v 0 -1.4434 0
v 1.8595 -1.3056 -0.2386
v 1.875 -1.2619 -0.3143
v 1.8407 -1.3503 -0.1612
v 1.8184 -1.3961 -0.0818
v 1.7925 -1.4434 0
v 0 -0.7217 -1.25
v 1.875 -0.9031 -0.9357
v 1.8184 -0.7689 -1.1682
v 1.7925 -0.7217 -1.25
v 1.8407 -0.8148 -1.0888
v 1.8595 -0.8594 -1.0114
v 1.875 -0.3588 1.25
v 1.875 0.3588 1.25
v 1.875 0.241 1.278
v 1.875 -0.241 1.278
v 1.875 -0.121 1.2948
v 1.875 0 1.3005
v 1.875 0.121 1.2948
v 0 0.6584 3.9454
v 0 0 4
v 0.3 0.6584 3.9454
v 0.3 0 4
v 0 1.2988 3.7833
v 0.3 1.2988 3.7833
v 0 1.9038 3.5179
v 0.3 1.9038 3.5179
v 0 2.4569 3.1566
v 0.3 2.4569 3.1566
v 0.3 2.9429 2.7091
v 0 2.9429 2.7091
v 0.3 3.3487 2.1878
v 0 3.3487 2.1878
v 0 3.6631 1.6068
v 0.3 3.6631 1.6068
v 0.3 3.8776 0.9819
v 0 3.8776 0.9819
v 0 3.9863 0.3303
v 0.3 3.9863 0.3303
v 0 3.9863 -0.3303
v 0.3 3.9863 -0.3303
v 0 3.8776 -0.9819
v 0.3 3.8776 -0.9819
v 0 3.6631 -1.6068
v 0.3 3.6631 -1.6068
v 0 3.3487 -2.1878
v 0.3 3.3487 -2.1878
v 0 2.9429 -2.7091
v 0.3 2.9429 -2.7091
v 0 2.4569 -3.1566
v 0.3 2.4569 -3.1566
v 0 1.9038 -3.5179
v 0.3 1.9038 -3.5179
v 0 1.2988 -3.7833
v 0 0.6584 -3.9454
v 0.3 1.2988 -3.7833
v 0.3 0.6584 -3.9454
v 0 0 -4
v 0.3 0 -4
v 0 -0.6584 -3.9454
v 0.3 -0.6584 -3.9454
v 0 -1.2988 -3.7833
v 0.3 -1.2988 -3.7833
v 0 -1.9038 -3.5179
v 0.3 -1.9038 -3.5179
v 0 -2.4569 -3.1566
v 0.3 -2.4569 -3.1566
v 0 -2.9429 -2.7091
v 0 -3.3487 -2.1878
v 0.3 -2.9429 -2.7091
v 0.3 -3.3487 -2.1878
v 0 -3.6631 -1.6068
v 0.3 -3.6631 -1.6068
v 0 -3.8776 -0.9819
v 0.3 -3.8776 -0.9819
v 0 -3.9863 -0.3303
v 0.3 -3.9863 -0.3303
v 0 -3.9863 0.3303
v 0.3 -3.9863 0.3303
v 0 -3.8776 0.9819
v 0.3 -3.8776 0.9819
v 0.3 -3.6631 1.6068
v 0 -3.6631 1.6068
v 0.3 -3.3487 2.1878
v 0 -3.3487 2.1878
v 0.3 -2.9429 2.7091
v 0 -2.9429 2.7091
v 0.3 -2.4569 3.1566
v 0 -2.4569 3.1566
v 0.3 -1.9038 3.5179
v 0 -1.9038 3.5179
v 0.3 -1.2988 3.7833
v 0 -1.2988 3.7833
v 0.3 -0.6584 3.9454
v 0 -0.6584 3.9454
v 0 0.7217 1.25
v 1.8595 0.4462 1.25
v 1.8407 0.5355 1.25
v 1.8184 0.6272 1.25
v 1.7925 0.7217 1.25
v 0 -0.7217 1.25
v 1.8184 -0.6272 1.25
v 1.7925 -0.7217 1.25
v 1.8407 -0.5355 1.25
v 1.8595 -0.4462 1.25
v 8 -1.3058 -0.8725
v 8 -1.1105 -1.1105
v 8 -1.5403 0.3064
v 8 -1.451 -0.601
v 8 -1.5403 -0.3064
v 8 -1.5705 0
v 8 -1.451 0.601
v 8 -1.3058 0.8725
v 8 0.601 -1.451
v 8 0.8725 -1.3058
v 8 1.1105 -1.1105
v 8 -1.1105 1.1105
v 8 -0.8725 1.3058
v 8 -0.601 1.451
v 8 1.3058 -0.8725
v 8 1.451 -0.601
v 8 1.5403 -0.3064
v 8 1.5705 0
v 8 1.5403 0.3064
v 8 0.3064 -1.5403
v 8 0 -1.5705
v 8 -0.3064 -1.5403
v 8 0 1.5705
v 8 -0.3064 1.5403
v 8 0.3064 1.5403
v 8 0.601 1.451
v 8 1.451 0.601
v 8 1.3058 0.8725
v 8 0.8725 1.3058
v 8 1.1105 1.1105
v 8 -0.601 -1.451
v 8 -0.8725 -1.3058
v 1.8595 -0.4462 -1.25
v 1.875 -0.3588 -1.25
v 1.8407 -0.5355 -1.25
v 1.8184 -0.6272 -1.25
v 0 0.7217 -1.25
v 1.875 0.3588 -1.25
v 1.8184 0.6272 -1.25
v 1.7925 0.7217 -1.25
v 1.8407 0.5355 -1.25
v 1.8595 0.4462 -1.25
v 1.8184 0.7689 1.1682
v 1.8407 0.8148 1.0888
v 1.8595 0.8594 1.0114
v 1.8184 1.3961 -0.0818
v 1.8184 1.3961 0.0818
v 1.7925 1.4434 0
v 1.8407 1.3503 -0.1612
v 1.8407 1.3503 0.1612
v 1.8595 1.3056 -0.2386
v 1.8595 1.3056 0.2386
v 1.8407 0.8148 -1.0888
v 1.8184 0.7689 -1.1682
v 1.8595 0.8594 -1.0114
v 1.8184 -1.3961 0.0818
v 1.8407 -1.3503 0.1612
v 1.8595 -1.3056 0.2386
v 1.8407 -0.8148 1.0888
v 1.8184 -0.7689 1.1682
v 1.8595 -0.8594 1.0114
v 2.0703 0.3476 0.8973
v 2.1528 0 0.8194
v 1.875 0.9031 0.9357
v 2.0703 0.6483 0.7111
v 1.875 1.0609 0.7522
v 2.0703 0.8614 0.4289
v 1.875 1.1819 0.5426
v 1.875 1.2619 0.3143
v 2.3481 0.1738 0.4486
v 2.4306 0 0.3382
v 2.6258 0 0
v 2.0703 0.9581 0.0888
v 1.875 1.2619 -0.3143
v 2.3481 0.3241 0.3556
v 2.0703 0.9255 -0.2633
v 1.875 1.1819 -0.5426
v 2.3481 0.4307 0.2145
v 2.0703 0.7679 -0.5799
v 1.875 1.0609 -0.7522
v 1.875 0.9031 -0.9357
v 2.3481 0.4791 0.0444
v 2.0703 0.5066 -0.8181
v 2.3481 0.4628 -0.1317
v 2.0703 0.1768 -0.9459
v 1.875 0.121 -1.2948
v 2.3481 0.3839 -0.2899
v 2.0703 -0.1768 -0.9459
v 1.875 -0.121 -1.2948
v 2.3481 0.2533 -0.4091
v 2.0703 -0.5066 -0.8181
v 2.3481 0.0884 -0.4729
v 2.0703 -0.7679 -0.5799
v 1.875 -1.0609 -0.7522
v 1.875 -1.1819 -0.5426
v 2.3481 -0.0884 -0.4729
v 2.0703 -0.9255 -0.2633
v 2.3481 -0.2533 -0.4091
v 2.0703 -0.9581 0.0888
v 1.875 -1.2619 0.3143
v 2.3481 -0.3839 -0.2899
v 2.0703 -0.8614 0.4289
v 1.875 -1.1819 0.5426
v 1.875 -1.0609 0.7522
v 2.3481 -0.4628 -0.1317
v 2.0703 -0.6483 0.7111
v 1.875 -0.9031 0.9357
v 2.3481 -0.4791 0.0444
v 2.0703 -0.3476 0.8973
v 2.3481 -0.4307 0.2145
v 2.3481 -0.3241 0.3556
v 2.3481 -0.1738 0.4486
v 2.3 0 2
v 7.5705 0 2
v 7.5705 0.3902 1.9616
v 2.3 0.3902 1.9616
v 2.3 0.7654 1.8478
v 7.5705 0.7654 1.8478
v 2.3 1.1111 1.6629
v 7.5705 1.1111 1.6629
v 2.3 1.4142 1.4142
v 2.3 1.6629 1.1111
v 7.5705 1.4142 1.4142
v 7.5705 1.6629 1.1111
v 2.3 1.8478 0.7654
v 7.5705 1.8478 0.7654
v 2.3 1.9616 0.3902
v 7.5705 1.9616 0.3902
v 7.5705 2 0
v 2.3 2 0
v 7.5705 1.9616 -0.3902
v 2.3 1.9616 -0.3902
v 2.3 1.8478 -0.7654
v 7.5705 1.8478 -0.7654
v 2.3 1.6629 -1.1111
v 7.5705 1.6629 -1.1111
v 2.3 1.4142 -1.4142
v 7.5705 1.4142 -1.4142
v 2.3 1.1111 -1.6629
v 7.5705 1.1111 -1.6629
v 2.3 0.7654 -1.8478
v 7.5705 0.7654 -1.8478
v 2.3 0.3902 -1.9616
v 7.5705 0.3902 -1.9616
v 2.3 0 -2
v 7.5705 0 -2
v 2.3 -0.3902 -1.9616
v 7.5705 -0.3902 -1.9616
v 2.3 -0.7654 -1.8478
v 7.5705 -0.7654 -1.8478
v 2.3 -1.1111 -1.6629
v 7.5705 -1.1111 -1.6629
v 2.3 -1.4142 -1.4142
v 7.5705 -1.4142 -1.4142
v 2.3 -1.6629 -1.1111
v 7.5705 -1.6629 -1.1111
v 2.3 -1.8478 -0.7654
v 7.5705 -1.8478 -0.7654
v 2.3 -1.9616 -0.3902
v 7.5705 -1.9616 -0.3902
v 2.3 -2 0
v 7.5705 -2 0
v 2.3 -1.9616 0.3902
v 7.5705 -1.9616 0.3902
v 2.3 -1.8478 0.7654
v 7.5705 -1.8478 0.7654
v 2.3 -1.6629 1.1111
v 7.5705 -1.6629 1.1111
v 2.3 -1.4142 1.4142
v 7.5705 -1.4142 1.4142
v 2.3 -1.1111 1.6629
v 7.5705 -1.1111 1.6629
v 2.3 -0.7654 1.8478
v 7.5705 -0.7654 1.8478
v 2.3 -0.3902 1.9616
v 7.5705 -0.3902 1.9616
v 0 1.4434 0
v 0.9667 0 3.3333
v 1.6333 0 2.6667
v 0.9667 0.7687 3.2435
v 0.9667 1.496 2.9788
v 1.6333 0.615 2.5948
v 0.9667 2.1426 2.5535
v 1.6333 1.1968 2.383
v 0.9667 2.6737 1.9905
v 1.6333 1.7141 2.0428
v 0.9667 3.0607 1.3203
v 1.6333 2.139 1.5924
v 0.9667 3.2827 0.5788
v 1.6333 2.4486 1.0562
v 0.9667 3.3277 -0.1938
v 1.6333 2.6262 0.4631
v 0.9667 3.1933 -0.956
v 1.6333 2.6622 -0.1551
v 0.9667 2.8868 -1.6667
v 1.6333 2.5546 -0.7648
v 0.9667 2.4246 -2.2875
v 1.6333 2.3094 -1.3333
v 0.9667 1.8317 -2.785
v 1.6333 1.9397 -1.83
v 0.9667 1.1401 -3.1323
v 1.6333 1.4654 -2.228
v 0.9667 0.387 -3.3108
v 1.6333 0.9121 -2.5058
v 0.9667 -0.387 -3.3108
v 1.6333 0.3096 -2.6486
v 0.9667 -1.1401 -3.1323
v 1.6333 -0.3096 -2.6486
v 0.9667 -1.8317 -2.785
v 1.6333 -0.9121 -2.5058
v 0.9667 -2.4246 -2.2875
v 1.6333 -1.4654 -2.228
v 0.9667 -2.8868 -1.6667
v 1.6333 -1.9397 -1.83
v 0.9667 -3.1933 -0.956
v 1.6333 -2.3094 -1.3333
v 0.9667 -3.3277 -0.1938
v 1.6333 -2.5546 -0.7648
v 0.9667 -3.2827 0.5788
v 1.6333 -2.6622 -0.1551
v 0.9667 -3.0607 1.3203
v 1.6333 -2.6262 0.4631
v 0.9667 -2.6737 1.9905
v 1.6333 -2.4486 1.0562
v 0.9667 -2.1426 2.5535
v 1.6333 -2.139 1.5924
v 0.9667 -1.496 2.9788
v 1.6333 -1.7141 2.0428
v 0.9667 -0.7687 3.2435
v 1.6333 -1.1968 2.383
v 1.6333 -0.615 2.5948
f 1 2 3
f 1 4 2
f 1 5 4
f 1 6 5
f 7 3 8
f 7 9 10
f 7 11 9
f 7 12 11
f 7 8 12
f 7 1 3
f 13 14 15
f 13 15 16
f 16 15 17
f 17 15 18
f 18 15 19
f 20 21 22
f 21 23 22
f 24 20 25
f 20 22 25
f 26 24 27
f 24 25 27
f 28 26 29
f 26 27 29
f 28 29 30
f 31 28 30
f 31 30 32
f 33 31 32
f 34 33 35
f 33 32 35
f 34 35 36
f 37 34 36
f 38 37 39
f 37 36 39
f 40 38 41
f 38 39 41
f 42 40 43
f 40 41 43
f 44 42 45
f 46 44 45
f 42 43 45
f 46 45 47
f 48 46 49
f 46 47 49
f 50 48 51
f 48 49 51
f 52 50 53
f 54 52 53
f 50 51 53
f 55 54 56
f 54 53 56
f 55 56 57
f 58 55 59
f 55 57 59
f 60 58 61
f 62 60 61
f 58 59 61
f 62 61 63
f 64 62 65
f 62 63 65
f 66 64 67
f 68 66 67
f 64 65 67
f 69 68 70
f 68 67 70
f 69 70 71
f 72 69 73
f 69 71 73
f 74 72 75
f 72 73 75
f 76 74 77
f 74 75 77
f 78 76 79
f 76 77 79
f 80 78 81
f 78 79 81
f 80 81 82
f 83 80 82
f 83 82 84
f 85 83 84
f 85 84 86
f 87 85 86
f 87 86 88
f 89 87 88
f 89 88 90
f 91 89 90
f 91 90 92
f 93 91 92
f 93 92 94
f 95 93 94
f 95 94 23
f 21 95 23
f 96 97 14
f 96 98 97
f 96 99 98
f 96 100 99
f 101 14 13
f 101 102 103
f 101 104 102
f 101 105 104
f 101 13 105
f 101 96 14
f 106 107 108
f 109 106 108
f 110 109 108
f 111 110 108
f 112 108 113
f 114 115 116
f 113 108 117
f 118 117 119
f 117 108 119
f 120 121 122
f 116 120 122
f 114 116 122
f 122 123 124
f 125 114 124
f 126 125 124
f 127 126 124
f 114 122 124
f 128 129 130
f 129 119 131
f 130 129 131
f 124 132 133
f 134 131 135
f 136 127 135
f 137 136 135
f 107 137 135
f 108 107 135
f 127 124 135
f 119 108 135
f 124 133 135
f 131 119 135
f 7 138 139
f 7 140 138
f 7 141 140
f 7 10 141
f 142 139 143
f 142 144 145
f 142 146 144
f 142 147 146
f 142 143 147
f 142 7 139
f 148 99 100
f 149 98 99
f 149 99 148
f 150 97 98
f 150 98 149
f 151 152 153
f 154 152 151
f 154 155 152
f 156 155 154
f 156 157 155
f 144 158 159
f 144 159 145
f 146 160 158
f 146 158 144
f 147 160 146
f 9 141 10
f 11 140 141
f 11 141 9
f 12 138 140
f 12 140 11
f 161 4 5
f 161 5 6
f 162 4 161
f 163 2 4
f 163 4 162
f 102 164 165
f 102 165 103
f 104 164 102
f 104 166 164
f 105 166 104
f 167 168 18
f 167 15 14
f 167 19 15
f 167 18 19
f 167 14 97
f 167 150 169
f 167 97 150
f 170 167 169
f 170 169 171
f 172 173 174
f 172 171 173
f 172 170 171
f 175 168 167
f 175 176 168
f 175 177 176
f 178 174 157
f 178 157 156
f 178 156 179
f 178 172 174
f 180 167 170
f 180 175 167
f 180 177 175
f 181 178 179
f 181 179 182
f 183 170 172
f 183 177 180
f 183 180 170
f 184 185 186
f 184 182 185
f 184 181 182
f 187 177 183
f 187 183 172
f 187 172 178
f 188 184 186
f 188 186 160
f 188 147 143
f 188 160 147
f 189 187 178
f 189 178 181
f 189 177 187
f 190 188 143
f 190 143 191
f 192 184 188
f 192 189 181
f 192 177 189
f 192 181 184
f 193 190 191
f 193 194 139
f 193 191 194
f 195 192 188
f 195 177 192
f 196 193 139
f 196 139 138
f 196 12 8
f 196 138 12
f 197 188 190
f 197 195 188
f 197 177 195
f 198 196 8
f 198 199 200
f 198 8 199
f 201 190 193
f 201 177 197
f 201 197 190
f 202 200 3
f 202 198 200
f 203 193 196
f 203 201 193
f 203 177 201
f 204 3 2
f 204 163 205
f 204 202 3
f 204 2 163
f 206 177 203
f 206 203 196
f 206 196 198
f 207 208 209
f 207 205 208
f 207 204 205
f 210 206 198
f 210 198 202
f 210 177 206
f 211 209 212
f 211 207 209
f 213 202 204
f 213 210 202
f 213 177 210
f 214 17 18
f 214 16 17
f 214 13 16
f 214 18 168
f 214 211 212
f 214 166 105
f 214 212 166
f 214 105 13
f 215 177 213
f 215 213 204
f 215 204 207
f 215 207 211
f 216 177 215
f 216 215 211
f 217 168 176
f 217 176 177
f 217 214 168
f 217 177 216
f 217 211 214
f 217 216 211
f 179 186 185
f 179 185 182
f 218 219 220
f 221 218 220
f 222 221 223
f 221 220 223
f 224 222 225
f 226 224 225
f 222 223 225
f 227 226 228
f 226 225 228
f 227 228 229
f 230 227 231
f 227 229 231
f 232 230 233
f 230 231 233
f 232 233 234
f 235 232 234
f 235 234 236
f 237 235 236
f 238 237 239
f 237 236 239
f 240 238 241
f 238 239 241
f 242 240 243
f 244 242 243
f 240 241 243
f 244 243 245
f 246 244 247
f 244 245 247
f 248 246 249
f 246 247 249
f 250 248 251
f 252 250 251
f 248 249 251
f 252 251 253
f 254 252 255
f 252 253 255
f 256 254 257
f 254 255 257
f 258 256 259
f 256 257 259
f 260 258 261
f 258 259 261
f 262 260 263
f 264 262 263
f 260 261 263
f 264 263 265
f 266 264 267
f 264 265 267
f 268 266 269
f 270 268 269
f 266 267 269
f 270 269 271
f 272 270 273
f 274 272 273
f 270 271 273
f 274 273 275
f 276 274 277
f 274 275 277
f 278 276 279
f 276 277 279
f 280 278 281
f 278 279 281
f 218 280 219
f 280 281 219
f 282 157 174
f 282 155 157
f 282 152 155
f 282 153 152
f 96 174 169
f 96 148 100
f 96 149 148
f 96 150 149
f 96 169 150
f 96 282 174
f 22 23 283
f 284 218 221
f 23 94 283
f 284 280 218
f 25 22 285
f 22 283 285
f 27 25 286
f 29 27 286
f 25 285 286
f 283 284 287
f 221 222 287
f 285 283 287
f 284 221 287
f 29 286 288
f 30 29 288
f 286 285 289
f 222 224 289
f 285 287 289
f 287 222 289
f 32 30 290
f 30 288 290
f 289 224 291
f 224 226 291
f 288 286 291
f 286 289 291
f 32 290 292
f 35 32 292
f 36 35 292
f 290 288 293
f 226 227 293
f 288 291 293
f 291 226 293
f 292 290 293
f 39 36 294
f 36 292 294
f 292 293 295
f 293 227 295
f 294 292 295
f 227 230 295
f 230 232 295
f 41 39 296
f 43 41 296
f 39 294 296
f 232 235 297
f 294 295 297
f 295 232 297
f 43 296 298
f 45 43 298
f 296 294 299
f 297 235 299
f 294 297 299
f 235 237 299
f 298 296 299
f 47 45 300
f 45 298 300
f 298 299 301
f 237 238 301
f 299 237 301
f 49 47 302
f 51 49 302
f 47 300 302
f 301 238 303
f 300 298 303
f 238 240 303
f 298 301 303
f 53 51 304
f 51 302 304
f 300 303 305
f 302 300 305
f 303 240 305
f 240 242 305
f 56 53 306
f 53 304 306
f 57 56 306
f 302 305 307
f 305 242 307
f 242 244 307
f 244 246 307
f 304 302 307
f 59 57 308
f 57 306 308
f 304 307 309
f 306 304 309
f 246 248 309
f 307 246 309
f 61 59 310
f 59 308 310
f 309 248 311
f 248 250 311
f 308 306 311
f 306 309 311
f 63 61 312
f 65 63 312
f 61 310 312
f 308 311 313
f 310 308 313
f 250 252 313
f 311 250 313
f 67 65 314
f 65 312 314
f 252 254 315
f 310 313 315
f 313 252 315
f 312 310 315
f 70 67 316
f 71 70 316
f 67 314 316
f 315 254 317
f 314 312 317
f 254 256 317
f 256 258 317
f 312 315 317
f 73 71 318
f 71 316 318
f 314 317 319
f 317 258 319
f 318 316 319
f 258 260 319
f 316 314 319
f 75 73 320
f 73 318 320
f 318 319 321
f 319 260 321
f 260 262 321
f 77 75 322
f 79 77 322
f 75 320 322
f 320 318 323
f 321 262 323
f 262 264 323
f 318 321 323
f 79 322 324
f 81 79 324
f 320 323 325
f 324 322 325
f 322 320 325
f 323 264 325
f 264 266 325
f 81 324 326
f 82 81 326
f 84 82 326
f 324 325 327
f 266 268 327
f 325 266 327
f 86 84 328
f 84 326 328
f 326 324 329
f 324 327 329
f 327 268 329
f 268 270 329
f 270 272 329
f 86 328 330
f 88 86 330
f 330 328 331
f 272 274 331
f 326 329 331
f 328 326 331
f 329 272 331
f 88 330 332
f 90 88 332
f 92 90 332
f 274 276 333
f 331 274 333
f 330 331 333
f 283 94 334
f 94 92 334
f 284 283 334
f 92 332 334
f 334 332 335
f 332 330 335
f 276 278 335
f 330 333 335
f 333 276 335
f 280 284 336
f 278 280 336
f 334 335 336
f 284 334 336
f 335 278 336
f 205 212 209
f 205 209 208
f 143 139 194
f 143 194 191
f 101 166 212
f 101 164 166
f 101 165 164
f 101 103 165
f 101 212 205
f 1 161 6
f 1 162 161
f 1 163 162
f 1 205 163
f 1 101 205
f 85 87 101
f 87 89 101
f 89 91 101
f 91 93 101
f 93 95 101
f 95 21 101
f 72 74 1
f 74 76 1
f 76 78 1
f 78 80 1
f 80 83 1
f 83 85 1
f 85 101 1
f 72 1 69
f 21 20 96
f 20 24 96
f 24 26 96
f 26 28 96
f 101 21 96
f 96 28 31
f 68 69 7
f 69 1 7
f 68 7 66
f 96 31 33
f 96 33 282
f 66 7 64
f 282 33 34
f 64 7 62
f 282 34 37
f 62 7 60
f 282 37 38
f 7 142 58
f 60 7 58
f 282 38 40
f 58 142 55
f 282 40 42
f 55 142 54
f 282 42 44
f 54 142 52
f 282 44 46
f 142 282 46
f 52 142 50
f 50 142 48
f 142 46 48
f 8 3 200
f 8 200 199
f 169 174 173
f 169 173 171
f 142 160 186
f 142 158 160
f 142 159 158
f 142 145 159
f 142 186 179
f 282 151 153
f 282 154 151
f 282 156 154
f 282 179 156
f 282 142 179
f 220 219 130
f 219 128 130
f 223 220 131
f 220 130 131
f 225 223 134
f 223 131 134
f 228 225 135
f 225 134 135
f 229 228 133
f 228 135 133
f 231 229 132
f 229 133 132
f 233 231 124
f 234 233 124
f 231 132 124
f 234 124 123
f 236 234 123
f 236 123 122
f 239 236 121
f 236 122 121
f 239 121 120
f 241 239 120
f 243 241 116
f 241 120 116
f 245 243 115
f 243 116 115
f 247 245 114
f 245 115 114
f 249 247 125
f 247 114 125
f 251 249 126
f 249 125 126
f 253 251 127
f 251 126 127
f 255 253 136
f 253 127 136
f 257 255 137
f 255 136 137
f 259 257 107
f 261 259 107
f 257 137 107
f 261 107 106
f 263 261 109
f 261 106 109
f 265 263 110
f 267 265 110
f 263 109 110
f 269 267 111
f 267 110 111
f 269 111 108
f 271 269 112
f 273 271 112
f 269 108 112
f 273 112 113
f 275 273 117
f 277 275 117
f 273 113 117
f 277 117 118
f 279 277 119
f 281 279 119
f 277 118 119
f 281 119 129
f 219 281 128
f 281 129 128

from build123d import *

# Parameters (mm, degrees)
SZKIC4_R                    = 2.25
DODANIE_WYCI_GNI_CIE1_DEPTH = 1.875


with BuildPart() as part:
    # Szkic1 → Obrót1 (revolve)
    with BuildSketch(Plane.XY):
        Polygon((0, 0), (0, 4), (0.3, 4), (2.3, 2), (2.3, 0), align=None)
    revolve(axis=Axis((2.3, 0, 0), (-1, 0, 0)))

    # Szkic2 → Obrót2 (revolve)
    with BuildSketch(Plane.XY):
        Polygon((2.3, 0), (2.3, 2), (7.5705, 2), (8, 1.5705), (8, 0), align=None)
    revolve(axis=Axis((8, 0, 0), (-1, 0, 0)))

    # Szkic3 → Wycięcie-obrót1 (revolve, cut)
    with BuildSketch(Plane.XY):
        Polygon((0, 0), (0, 1.95), (1.5, 1.95), (2.625833025, 0), align=None)
    revolve(axis=Axis((2.625833025, 0, 0), (-1, 0, 0)), mode=Mode.SUBTRACT)

    # Szkic4 → Dodanie-wyciągnięcie1 (add)
    with BuildSketch(Plane(origin=(0, 0, 0), x_dir=(0, 0, -1), z_dir=(1, 0, 0))):
        Circle(SZKIC4_R)
        Polygon((-1.25, 0.721687836), (-1.25, -0.721687836), (0, -1.443375673), (1.25, -0.721687836), (1.25, 0.721687836), (0, 1.443375673), align=None, mode=Mode.SUBTRACT)
    extrude(amount=DODANIE_WYCI_GNI_CIE1_DEPTH)


solid = part.part
